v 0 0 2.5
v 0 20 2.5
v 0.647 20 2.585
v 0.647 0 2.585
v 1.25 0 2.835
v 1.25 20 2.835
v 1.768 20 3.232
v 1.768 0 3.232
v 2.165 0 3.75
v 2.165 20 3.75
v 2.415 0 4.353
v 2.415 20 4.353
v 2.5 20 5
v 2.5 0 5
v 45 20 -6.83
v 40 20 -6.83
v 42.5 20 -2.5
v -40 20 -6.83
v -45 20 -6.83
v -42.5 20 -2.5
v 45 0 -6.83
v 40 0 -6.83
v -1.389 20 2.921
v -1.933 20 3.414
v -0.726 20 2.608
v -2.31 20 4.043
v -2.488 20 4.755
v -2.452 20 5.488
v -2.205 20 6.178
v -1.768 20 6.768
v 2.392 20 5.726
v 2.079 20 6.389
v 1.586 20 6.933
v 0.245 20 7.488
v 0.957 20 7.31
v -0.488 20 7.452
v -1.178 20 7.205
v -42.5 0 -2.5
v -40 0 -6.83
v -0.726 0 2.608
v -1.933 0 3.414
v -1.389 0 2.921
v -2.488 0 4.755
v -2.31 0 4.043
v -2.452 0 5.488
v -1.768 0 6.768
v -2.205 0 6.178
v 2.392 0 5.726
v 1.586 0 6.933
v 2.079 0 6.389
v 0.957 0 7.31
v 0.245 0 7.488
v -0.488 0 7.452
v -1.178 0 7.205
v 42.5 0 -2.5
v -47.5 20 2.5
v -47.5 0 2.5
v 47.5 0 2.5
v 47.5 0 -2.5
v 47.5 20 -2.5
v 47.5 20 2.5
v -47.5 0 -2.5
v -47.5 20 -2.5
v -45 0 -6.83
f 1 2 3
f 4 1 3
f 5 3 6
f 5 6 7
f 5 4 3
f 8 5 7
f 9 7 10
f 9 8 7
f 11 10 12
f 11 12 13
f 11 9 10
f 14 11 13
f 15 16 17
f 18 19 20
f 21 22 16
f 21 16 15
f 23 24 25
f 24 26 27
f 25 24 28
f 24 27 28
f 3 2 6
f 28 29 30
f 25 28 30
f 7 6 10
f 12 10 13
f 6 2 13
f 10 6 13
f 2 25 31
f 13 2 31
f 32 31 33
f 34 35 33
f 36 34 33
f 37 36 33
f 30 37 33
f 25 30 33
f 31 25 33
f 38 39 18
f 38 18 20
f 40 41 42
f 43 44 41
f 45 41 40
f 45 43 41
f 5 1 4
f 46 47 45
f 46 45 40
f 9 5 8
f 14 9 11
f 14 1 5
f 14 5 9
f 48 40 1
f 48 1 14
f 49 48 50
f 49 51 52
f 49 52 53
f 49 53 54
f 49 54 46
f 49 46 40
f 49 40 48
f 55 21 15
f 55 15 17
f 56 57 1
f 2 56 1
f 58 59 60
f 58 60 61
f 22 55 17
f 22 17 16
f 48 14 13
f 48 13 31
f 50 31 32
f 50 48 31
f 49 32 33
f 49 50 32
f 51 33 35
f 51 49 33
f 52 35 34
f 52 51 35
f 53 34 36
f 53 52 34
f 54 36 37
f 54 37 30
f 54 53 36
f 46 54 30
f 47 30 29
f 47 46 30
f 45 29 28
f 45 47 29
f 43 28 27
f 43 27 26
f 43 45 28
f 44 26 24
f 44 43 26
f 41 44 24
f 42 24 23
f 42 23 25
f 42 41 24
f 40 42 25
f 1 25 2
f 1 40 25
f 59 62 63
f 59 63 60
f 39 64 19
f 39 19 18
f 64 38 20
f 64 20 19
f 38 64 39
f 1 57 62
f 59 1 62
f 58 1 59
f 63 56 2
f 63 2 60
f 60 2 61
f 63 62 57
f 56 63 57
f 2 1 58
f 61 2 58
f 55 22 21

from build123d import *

# Parameters (mm, degrees)
F0_W     = 95
F0_H     = 5
F1_DEPTH = 20
F4_DEPTH = 20
F6_DEPTH = 20
F7_DEPTH = 20


with BuildPart() as f1:
    # F0 (on Front) → F1 (new body)
    with BuildSketch(Plane.XZ):
        Rectangle(F0_W, F0_H)
    extrude(amount=-F1_DEPTH)

    # F3 (on face) → F4 (join)
    with BuildSketch(Plane.XZ):
        with BuildLine():
            ThreePointArc((0, 2.5), (1.767767, 3.232233), (2.5, 5))
            ThreePointArc((2.5, 5), (-1.767767, 6.767767), (0, 2.5))
        make_face()
    extrude(amount=-F4_DEPTH)


with BuildPart() as f6:
    # F5 (on Front) → F6 (new body)
    with BuildSketch(Plane.XZ):
        Polygon((-45, -6.830127), (-40, -6.830127), (-42.5, -2.5), align=None)
    extrude(amount=-F6_DEPTH)


with BuildPart() as f7:
    # F5 (on Front) → F7 (new body)
    with BuildSketch(Plane.XZ):
        Polygon((40, -6.830127), (45, -6.830127), (42.5, -2.5), align=None)
    extrude(amount=-F7_DEPTH)


solid = Compound([f1.part, f6.part, f7.part])
